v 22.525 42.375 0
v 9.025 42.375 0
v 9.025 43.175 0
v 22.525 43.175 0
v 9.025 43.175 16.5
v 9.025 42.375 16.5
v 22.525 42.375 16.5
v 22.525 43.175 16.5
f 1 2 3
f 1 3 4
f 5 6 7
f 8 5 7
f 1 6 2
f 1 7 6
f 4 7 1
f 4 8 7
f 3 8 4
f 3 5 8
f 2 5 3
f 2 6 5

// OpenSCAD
// file: measurements/print_settings.scad
/**
 * The diameter of the nozzle, in millimeters.  No features narrower than this can be produced.
 */
nozzle_diameter = 0.4;

/**
 * The height of a layer, in millimeters.  No features shorter than this can be produced.
 */
layer_height = 0.2;

/**
 * Added to small features to combat rounding errors.
 */
fudge = 0.00001;

/**
 * Cut out of any concave corners to prevent pinching.
 */
concave_corner_cut_size = 3;
// file: calculations/pcb.scad
include <../measurements/corner.scad>;
include <../measurements/pcb.scad>;
include <../measurements/wall.scad>;
include <wall.scad>;

/**
 * The location of the left edge of the PCB, in millimeters.
 */
pcb_left = corner_radius + wall_surround + wall_tolerance + wall_thickness + wall_tolerance + pcb_xy_tolerance;

/**
 * The location of the bottom edge of the PCB, in millimeters.
 */
pcb_bottom = wall_surround + wall_tolerance + wall_thickness + wall_tolerance + pcb_xy_tolerance;
// file: measurements/infrared.scad
/**
 * The distance between the left edge of the PCB and the left edge of the infrared window.
 */
infrared_pcb_left = 0.925;

/**
 * The width of the infrared window, in millimeters.
 */
infrared_width = 13.5;

/**
 * The tolerance either side of the infrared window, in millimeters.
 */
infrared_tolerance = 0.125;
// file: calculations/wall.scad
include <../measurements/print_settings.scad>;
include <../measurements/wall.scad>;

/**
 * The thickness of the wall, in millimeters.
 */
wall_thickness = wall_thickness_nozzle_diameters * nozzle_diameter + fudge;

/**
 * The minimum amount of plastic surrounding the wall-retaining grooves in the front and back faces, in millimeters.
 */
wall_surround = wall_surround_nozzle_diameters * nozzle_diameter + fudge;
// file: measurements/plate.scad
/**
 * The thickness of the front and back plates, in millimeters.
 */
plate_thickness = 1.6;
// file: measurements/display.scad
/**
 * The distance between the left and right edges of the display's casing, in millimeters.
 */
display_width = 35.5;

/**
 * The distance between the top and bottom edges of the display's casing, in millimeters.
 */
display_height = 38.3;

/**
 * The distance between the (visible) front and (PCB-facing) back faces of the display's casing, ignoring the connector, in millimeters.
 */
display_thickness = 1.75;

/**
 * The distance between the left edge of the display's casing and the left edge of its viewable area, in millimeters.
 */
display_left_padding = 3.5;

/**
 * The distance between the right edge of the display's casing and the right edge of its viewable area, in millimeters.
 */
display_right_padding = 10.5;

/**
 * The distance between the top edge of the display's casing and the left top of its viewable area, in millimeters.
 */
display_top_padding = 4;

/**
 * The distance between the left edge of the display's casing and the bottom edge of its viewable area, in millimeters.
 */
display_bottom_padding = 4;

/**
 * The sizes of the radiuses of the corners of the shell's display cutout, in millimeters.
 */
display_radius_size = 2;

/**
 * The number of sides of each corner radius of the shell's display cutout.
 */
display_radius_sides = 16;

/**
 * The amount of margin on each side of the display's visible area, in millimeters; effectively expands the display by this amount in each direction.
 */
display_cutout_margin = 1;

/**
 * The amount of tolerance between each side of the display's casing and the retaining wall, in millimeters.
 */
display_xy_tolerance = 0.25;

/**
 * The thickness of the display retaining wall, in millimeters.
 */
display_wall_thickness = 0.6;

/**
 * The amount of tolerance between the display's (PCB-facing) back face and the retaining clip, in millimeters.
 */
display_z_tolerance = -0.1;

/**
 * The width of the display retaining clip, in millimeters.
 */
display_clip_width = 1.2;

/**
 * The thickness of the display retaining clip, in millimeters.
 */
display_clip_thickness = 0.8;

/**
 * The distance between the display's casing (ignoring the connector) and the PCB, in millimeters.
 */
display_pcb_distance = 1.1;

/**
 * The distance between the left edge of the display's casing and the left edge of the PCB, in millimeters.
 */
display_pcb_left = 0.8;

/**
 * The distance between the bottom edge of the display's casing and the bottom edge of the PCB, in millimeters.
 */
display_pcb_bottom = 0.8;

/**
 * The thickness of the front bezel, in millimeters.
 */
display_bezel_thickness = 2;
// file: measurements/wall.scad
/**
 * The thickness of the wall, in nozzle diameters.
 */
wall_thickness_nozzle_diameters = 2;

/**
 * The amount of tolerance around the wall in the grooves in the front and back faces, in millimeters.
 */
wall_tolerance = 0.125;

/**
 * The minimum amount of plastic surrounding the wall-retaining grooves in the front and back faces, in nozzle diameters.
 */
wall_surround_nozzle_diameters = 2;

/**
 * The number of millimeters that the wall embeds into the front and back faces.
 */
wall_embed = 0.5;
// file: measurements/pcb.scad
/**
 * The distance between the left and right edges of the PCB, in millimeters.
 */
pcb_width = 53.68;

/**
 * The distance between the top and bottom edges of the PCB, in millimeters.
 */
pcb_height = 39.90;

/**
 * The thickness of the PCB, in millimeters.
 */
pcb_thickness = 1.6;

/**
 * The amount of tolerance between each side of the PCB's casing and the retaining wall, in millimeters.
 */
pcb_xy_tolerance = 0.25;

/**
 * The amount of tolerance above and below the PCB, in millimeters.
 */
pcb_z_tolerance = 0.125;

/**
 * The thickness of the PCB retaining wall, in millimeters.
 */
pcb_retainer_thickness = 0.6;

/**
 * The amount of clearance behind the PCB, in millimeters.
 */
pcb_back_clearance = 10;
// file: measurements/corner.scad
include <pcb.scad>;

/**
 * The radius of a corner, in millimeters.
 */
corner_radius = 6;

/**
 * The number of sides on a corner.
 */
corner_sides = 72;
// file: modules/infrared_window.scad
include <../measurements/infrared.scad>;
include <../measurements/pcb.scad>;
include <../calculations/pcb.scad>;
include <../calculations/wall.scad>;

module infrared_window() {
  translate([
    pcb_left + infrared_pcb_left,
    pcb_bottom + pcb_height + pcb_xy_tolerance + wall_tolerance,
  ]) {
    square([infrared_width, wall_thickness]);
  };
};
// file: calculations/overall.scad
include <../measurements/corner.scad>;
include <../measurements/pcb.scad>;
include <../measurements/wall.scad>;
include <../measurements/display.scad>;
include <../measurements/plate.scad>;
include <wall.scad>;

/**
 * The width of the assembled device, in millimeters.
 */
overall_width = corner_radius + wall_surround + wall_tolerance + wall_thickness + wall_tolerance + pcb_xy_tolerance
  + pcb_width
  + pcb_xy_tolerance + wall_tolerance + wall_thickness + wall_tolerance + wall_surround + corner_radius;

/**
 * The height of the assembled device, in millimeters.
 */
overall_height = wall_surround + wall_tolerance + wall_thickness + wall_tolerance + pcb_xy_tolerance
  + pcb_height
  + pcb_xy_tolerance + wall_tolerance + wall_thickness + wall_tolerance + wall_surround;

/**
 * The depth of the assembled device, in millimeters.
 */
overall_depth = display_bezel_thickness + display_thickness + display_pcb_distance + pcb_z_tolerance + pcb_thickness + pcb_z_tolerance + pcb_back_clearance + display_bezel_thickness;

// TODO: circular dependency here

/**
 * The height of the wall, in millimeters.
 */
wall_height = overall_depth - plate_thickness * 2 + wall_embed * 2;
// main file
include <calculations/overall.scad>;
include <modules/infrared_window.scad>;

linear_extrude(wall_height) {
  infrared_window();
};
